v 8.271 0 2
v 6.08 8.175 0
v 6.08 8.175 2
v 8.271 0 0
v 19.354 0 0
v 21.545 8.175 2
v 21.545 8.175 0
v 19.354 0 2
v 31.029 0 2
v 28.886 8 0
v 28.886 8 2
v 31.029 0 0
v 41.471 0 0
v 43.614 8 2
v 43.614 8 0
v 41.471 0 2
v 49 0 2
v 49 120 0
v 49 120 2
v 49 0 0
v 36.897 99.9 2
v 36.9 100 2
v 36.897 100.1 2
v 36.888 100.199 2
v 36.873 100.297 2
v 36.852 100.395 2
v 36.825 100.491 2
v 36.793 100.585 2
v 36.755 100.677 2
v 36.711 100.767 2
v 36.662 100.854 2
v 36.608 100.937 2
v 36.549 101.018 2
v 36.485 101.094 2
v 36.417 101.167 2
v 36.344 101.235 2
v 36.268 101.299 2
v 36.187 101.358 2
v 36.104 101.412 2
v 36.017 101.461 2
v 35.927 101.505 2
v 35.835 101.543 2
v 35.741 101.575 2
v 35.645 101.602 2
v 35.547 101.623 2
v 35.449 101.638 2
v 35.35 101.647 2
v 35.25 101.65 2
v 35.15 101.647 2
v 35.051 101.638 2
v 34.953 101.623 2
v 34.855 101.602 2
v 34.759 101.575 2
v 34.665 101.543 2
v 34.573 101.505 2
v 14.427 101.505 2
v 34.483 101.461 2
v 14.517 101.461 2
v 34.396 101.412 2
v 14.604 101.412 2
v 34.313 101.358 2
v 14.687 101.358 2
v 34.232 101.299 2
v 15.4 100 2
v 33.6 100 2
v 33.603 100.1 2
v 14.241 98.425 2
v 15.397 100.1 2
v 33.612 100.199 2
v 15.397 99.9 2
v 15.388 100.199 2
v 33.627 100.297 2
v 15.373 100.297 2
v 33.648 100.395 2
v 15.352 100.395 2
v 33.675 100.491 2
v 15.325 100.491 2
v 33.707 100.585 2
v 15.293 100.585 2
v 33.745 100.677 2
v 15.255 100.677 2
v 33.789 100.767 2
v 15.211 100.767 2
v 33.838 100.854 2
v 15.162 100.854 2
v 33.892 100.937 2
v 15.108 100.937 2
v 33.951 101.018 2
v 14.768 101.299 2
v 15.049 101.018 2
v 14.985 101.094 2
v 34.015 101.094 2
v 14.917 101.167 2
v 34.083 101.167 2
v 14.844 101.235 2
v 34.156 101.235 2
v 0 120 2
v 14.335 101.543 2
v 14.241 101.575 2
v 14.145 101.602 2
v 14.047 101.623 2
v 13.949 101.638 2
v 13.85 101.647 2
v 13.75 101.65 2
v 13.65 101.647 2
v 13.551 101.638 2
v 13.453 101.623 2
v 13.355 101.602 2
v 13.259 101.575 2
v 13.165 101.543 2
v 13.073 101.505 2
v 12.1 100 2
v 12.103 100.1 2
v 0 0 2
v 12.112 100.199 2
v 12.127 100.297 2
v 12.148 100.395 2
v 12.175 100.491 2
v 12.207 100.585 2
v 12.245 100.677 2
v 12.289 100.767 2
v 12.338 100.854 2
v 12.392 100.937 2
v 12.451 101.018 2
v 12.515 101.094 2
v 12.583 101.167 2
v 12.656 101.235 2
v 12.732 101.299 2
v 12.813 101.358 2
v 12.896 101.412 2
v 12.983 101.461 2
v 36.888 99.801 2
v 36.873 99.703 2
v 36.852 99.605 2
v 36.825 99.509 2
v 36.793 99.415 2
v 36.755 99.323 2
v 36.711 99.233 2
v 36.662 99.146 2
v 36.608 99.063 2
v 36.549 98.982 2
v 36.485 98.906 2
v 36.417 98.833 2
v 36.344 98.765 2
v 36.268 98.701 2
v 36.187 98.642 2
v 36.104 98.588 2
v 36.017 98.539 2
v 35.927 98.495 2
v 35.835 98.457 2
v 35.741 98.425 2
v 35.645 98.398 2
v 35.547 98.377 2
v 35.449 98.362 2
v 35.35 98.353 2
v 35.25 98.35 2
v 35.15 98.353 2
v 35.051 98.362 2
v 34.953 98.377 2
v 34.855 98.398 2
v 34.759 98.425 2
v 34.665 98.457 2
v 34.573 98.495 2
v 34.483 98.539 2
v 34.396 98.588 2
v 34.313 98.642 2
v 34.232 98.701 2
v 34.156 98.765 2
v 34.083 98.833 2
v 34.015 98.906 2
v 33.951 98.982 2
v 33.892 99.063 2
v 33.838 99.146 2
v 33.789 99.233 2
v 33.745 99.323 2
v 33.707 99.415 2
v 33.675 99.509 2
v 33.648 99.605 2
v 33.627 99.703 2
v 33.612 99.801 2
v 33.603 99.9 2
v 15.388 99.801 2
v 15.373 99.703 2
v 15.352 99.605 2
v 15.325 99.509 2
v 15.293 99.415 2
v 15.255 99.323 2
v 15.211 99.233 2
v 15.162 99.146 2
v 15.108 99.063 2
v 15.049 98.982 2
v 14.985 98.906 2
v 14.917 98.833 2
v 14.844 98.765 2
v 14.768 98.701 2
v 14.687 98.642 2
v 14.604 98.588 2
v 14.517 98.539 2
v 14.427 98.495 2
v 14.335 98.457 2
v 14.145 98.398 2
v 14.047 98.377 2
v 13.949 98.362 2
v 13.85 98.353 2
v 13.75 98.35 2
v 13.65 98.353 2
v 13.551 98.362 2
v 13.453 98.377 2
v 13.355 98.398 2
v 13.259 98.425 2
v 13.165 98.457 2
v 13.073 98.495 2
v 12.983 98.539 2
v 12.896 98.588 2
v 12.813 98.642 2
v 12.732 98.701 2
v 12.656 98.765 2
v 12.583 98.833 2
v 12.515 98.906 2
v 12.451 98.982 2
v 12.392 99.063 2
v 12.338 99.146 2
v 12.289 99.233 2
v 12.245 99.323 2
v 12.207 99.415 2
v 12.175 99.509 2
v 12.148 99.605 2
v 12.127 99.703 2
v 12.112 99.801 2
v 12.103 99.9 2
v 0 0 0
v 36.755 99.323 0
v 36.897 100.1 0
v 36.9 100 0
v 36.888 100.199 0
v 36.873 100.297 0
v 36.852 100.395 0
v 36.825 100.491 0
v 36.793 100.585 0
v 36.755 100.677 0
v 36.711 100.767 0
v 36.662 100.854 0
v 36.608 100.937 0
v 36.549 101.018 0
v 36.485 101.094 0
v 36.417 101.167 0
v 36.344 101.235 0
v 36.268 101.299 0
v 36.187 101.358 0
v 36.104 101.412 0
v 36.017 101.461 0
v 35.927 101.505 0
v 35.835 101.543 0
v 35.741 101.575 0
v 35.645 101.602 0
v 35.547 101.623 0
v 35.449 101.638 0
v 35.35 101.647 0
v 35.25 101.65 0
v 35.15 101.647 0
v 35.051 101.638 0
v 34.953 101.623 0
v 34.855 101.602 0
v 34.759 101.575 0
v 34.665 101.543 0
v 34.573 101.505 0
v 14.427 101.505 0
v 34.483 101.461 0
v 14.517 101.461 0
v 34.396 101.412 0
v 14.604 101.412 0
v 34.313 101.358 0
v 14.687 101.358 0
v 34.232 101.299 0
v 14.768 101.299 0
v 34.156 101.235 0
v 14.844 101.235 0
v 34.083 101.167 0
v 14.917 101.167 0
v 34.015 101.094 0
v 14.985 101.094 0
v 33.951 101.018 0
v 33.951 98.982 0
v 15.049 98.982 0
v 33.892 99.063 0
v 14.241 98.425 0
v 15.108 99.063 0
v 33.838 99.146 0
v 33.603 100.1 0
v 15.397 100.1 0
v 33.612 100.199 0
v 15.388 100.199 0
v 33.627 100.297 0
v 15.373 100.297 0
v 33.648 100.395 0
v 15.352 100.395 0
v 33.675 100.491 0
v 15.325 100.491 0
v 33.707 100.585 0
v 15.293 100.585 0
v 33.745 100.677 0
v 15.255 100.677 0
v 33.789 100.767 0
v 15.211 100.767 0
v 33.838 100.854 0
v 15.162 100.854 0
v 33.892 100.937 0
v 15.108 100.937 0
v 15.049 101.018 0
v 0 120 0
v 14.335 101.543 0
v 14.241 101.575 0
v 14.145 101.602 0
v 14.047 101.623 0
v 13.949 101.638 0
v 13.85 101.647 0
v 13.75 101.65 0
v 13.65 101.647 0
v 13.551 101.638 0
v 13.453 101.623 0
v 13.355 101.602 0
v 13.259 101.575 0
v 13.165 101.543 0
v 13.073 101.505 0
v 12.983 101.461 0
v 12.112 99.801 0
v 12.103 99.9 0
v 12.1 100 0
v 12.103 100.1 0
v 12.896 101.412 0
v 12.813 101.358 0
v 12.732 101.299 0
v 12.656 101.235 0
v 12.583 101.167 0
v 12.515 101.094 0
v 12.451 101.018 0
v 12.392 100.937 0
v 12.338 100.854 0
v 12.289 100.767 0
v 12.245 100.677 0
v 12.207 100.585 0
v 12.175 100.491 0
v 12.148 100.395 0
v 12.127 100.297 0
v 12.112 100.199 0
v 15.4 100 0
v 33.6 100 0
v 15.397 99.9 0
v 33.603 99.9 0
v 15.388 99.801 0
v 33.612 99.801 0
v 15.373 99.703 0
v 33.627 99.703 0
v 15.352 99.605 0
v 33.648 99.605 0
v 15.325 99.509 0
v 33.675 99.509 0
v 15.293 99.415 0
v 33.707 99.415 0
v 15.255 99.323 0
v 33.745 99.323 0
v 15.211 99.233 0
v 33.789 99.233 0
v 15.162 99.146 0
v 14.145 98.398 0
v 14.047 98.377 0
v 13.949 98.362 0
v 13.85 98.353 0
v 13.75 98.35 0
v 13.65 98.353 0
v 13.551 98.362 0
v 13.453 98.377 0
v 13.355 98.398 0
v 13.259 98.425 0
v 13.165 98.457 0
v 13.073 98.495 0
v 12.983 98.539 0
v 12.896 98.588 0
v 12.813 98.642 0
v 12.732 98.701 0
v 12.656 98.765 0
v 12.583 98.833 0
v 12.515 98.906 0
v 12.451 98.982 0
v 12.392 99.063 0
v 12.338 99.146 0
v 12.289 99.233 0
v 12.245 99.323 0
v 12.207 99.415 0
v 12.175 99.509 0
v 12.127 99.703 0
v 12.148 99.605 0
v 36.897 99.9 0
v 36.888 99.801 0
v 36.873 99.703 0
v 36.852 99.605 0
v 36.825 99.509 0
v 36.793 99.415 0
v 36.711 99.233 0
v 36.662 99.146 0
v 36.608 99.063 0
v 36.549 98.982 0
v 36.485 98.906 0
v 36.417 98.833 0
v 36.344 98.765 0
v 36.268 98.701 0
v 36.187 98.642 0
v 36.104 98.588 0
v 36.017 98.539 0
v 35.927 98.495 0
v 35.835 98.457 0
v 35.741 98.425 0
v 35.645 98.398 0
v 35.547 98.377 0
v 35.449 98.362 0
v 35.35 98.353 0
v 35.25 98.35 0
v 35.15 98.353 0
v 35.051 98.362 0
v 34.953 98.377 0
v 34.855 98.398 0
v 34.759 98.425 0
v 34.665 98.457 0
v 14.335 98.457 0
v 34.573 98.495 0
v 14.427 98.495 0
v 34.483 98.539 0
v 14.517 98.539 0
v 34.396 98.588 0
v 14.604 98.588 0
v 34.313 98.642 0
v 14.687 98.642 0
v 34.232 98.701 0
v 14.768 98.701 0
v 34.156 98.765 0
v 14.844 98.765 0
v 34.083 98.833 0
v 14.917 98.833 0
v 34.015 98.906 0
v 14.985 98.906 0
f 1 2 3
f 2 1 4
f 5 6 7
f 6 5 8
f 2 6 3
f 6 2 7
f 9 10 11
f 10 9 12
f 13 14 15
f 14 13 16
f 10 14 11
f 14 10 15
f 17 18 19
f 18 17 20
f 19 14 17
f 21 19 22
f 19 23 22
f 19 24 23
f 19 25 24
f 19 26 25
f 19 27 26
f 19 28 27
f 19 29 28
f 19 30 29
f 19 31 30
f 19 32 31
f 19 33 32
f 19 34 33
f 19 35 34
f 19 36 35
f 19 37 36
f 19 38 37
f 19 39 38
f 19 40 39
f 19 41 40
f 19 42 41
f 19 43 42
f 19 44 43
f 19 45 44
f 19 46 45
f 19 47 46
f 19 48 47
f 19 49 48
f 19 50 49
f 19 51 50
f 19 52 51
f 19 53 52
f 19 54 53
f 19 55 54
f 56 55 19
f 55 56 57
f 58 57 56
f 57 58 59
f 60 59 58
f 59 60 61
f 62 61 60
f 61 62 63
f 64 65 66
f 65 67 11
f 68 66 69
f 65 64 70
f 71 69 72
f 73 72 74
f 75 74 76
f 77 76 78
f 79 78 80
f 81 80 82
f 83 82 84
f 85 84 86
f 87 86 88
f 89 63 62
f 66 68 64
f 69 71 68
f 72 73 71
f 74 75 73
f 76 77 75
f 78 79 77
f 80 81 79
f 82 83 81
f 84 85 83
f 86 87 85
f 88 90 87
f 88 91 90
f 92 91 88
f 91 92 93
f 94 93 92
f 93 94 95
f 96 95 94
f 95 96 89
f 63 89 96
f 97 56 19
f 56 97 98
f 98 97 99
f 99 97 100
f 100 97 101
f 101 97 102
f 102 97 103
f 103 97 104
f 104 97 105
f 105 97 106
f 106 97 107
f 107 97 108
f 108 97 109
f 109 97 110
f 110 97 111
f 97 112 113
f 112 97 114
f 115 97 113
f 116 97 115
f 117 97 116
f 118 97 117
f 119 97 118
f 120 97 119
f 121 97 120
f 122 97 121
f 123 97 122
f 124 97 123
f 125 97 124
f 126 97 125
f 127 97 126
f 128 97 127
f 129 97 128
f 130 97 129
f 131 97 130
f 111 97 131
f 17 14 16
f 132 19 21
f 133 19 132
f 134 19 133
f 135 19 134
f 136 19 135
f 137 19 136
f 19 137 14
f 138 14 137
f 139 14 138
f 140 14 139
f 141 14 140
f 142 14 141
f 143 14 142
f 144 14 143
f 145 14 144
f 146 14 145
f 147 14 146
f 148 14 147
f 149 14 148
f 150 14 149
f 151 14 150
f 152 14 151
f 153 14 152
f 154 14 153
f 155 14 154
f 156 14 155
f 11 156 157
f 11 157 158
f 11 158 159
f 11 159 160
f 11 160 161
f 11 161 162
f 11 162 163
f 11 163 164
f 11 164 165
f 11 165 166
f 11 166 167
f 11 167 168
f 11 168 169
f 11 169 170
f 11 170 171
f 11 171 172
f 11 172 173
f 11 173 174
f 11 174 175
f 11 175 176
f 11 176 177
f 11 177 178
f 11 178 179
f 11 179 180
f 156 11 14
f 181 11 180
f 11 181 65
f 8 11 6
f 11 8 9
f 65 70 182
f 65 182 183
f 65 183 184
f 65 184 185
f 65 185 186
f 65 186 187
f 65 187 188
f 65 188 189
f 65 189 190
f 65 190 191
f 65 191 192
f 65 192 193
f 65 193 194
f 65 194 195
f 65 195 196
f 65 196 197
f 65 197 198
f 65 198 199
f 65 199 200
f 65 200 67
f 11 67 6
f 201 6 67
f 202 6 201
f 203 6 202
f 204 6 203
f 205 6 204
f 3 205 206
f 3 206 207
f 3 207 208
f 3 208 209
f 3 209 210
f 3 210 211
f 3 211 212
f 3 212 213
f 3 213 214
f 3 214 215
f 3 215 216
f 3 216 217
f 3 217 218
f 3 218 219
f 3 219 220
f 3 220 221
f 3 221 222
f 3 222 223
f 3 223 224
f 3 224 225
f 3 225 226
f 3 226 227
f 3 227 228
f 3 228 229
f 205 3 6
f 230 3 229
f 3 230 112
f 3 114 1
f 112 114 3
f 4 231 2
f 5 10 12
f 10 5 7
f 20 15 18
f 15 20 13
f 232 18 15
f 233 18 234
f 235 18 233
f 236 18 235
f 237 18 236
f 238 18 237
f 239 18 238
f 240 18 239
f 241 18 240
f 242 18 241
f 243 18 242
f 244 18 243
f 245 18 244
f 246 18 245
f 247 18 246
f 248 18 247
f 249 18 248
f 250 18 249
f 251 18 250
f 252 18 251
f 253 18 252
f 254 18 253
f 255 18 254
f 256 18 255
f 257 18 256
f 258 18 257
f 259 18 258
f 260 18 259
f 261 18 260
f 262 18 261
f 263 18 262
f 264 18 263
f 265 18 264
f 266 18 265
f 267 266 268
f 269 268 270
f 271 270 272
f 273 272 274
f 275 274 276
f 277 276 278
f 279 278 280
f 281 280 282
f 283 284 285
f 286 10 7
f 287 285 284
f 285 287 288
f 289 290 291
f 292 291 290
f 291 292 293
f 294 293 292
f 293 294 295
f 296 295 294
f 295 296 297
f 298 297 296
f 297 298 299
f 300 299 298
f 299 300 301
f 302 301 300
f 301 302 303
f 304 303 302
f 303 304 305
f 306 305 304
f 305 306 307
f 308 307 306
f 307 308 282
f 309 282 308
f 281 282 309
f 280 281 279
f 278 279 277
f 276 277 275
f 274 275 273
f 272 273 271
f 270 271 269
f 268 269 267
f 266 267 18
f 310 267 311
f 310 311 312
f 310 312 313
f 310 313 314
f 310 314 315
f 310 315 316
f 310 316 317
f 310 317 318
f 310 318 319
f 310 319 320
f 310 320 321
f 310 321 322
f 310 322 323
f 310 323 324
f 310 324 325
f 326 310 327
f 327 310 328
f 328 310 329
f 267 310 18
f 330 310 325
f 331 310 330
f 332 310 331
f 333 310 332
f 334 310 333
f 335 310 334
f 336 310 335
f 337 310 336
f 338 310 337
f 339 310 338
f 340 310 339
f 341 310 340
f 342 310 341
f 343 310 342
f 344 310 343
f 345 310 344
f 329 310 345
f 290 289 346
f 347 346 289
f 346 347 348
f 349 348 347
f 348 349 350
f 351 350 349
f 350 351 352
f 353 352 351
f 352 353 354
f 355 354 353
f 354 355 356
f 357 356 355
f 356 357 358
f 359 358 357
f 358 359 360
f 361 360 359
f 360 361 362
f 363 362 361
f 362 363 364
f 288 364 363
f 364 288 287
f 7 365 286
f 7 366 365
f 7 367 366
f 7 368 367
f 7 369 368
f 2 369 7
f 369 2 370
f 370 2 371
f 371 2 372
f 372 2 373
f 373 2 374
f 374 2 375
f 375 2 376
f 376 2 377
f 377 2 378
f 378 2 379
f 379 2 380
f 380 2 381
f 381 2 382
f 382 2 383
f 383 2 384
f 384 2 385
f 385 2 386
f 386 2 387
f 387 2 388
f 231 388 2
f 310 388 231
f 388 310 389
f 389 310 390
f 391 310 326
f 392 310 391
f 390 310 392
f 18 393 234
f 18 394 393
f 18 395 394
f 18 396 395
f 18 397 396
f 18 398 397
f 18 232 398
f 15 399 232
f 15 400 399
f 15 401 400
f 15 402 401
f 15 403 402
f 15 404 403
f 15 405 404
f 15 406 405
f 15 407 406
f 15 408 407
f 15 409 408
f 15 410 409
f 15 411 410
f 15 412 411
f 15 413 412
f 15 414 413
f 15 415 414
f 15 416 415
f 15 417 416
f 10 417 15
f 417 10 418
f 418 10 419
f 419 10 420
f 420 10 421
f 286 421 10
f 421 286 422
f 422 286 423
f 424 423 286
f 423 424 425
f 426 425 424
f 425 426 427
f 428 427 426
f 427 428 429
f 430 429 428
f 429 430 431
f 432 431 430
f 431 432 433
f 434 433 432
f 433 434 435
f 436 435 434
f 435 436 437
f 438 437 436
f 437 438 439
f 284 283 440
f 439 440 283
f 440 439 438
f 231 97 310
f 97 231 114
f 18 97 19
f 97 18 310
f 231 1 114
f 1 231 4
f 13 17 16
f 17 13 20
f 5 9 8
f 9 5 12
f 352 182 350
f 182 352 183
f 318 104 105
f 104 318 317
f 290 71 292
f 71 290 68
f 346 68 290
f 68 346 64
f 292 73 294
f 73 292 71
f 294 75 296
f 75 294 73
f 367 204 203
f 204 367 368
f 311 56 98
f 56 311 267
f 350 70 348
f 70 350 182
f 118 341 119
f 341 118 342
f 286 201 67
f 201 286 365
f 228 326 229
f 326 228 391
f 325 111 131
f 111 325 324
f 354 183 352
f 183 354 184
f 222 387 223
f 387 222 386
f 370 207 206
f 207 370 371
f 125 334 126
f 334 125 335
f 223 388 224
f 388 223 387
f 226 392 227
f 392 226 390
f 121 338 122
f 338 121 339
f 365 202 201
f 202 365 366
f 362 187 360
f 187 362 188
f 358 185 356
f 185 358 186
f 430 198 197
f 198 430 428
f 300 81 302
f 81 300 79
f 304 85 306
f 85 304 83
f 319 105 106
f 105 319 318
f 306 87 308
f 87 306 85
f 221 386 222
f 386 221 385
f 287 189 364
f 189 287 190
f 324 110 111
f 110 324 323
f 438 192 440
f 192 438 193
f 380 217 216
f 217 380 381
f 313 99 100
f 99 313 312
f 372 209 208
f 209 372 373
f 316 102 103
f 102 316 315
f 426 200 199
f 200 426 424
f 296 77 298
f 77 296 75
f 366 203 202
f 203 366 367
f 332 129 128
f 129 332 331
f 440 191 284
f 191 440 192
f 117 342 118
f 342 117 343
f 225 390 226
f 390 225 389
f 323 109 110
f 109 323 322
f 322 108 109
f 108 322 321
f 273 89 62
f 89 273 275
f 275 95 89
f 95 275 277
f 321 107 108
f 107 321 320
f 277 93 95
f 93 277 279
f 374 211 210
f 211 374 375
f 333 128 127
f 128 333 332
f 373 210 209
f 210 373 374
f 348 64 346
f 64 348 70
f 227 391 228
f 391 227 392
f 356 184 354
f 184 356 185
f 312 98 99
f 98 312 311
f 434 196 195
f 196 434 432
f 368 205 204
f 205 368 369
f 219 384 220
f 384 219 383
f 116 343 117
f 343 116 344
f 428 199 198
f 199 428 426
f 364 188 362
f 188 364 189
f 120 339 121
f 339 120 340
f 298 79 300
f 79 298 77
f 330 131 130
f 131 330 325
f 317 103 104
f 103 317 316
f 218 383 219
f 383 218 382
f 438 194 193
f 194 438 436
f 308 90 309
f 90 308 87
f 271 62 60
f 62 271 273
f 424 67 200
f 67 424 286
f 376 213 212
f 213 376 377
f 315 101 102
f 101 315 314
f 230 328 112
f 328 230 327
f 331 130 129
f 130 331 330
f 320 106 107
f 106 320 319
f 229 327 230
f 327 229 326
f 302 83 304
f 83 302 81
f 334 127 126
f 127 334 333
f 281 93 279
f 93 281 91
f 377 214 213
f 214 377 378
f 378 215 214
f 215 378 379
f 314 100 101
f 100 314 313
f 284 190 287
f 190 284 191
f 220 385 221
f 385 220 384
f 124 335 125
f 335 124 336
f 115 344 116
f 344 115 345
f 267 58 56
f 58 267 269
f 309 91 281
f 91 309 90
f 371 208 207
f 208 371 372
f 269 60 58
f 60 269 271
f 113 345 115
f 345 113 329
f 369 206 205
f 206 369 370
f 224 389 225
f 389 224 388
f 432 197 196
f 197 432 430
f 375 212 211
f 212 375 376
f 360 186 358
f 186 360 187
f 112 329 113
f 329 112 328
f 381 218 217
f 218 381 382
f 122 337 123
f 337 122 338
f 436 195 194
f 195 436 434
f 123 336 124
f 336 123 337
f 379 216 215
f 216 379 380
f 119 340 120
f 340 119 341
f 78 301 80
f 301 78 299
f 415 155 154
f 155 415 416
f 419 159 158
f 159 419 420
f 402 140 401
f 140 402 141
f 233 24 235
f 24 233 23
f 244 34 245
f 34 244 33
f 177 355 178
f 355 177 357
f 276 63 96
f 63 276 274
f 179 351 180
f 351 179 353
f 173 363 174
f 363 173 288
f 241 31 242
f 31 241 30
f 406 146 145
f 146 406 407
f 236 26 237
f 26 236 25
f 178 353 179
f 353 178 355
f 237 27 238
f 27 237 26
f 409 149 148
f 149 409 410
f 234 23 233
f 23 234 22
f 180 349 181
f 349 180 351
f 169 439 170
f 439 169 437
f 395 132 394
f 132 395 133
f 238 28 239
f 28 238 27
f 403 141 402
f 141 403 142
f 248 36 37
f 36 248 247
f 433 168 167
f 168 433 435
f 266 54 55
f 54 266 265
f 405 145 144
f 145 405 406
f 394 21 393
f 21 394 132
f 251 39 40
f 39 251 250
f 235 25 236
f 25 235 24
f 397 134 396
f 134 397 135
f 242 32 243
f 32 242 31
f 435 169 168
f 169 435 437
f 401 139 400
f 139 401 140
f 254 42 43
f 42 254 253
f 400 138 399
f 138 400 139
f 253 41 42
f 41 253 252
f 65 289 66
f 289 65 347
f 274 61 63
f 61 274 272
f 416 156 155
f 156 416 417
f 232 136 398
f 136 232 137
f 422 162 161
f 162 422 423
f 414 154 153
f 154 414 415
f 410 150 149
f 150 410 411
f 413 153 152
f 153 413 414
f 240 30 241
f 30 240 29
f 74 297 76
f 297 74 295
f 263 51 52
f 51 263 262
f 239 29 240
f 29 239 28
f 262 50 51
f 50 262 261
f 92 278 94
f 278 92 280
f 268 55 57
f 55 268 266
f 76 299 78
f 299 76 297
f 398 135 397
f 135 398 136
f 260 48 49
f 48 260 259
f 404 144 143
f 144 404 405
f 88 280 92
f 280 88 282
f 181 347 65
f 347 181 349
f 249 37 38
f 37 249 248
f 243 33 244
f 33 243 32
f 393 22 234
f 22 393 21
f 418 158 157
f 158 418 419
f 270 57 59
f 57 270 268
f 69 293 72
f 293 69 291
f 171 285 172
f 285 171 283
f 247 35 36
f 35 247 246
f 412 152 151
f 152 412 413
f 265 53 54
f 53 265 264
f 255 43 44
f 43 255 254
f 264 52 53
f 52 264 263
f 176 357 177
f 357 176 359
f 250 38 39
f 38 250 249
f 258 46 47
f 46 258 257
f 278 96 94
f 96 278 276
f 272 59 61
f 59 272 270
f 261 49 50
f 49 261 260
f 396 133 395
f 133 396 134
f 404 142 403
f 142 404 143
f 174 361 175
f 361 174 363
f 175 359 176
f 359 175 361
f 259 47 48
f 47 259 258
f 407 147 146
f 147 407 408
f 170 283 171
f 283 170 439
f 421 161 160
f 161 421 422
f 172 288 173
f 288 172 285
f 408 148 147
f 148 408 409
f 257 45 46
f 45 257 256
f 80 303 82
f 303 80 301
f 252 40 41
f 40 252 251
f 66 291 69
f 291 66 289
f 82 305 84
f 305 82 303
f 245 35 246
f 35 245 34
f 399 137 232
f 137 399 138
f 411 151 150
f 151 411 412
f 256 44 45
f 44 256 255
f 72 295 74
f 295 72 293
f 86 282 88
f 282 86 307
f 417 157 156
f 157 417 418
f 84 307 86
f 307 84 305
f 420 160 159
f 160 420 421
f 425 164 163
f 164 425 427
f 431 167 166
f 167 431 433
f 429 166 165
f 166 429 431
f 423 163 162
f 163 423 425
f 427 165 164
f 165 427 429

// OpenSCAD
$fa = 1;
$fs = 0.1;

panel_height = 45;
panel_length = 120;
panel_depth = 2;

wall_thickness = 2;

// 21.5 gap
// 18.5 / 2

module tray () {
    cube([
        panel_height + (wall_thickness * 2),
        panel_length,
        panel_depth
    ]);
}

module _wedge () {
    rotate([0, 0, 15])
        cube([10, 10, wall_thickness], center=true);

    translate([-2.5, 0, 0])
        rotate([0, 0, -15])
        cube([10, 10, wall_thickness], center=true);
}

module wedge () {
    difference() {
        _wedge();

        translate([0, -6, 0])
            cube([20, 5, wall_thickness + 0.002], center=true);

        translate([0, 7.25, 0])
            cube([20, 5, wall_thickness + 0.002], center=true);
    }
}


difference() {
    tray();

    translate([12.5, 4.5, (wall_thickness / 2) - 0.001])
        rotate([0, 0, 180])
        scale([1.05, 1.05, 1.1])
        wedge();

    translate([35, 4.5, (wall_thickness / 2) - 0.001])
        rotate([0, 0, 180])
        scale([1, 1, 1.1])
        wedge();

    translate([((panel_height + (wall_thickness * 2)) / 2) - (21.5/2), panel_length - 20, 0])
        cylinder(r=3.3/2, h=10, center=true);
    translate([((panel_height + (wall_thickness * 2)) / 2) + (21.5/2), panel_length - 20, 0])
        cylinder(r=3.3/2, h=10, center=true);
}

//translate([12.5, panel_length + 4.5, wall_thickness / 2])
//    rotate([0, 0, 180])
//    wedge();

//translate([35, panel_length + 4.5, wall_thickness / 2])
//    rotate([0, 0, 180])
//    wedge();
